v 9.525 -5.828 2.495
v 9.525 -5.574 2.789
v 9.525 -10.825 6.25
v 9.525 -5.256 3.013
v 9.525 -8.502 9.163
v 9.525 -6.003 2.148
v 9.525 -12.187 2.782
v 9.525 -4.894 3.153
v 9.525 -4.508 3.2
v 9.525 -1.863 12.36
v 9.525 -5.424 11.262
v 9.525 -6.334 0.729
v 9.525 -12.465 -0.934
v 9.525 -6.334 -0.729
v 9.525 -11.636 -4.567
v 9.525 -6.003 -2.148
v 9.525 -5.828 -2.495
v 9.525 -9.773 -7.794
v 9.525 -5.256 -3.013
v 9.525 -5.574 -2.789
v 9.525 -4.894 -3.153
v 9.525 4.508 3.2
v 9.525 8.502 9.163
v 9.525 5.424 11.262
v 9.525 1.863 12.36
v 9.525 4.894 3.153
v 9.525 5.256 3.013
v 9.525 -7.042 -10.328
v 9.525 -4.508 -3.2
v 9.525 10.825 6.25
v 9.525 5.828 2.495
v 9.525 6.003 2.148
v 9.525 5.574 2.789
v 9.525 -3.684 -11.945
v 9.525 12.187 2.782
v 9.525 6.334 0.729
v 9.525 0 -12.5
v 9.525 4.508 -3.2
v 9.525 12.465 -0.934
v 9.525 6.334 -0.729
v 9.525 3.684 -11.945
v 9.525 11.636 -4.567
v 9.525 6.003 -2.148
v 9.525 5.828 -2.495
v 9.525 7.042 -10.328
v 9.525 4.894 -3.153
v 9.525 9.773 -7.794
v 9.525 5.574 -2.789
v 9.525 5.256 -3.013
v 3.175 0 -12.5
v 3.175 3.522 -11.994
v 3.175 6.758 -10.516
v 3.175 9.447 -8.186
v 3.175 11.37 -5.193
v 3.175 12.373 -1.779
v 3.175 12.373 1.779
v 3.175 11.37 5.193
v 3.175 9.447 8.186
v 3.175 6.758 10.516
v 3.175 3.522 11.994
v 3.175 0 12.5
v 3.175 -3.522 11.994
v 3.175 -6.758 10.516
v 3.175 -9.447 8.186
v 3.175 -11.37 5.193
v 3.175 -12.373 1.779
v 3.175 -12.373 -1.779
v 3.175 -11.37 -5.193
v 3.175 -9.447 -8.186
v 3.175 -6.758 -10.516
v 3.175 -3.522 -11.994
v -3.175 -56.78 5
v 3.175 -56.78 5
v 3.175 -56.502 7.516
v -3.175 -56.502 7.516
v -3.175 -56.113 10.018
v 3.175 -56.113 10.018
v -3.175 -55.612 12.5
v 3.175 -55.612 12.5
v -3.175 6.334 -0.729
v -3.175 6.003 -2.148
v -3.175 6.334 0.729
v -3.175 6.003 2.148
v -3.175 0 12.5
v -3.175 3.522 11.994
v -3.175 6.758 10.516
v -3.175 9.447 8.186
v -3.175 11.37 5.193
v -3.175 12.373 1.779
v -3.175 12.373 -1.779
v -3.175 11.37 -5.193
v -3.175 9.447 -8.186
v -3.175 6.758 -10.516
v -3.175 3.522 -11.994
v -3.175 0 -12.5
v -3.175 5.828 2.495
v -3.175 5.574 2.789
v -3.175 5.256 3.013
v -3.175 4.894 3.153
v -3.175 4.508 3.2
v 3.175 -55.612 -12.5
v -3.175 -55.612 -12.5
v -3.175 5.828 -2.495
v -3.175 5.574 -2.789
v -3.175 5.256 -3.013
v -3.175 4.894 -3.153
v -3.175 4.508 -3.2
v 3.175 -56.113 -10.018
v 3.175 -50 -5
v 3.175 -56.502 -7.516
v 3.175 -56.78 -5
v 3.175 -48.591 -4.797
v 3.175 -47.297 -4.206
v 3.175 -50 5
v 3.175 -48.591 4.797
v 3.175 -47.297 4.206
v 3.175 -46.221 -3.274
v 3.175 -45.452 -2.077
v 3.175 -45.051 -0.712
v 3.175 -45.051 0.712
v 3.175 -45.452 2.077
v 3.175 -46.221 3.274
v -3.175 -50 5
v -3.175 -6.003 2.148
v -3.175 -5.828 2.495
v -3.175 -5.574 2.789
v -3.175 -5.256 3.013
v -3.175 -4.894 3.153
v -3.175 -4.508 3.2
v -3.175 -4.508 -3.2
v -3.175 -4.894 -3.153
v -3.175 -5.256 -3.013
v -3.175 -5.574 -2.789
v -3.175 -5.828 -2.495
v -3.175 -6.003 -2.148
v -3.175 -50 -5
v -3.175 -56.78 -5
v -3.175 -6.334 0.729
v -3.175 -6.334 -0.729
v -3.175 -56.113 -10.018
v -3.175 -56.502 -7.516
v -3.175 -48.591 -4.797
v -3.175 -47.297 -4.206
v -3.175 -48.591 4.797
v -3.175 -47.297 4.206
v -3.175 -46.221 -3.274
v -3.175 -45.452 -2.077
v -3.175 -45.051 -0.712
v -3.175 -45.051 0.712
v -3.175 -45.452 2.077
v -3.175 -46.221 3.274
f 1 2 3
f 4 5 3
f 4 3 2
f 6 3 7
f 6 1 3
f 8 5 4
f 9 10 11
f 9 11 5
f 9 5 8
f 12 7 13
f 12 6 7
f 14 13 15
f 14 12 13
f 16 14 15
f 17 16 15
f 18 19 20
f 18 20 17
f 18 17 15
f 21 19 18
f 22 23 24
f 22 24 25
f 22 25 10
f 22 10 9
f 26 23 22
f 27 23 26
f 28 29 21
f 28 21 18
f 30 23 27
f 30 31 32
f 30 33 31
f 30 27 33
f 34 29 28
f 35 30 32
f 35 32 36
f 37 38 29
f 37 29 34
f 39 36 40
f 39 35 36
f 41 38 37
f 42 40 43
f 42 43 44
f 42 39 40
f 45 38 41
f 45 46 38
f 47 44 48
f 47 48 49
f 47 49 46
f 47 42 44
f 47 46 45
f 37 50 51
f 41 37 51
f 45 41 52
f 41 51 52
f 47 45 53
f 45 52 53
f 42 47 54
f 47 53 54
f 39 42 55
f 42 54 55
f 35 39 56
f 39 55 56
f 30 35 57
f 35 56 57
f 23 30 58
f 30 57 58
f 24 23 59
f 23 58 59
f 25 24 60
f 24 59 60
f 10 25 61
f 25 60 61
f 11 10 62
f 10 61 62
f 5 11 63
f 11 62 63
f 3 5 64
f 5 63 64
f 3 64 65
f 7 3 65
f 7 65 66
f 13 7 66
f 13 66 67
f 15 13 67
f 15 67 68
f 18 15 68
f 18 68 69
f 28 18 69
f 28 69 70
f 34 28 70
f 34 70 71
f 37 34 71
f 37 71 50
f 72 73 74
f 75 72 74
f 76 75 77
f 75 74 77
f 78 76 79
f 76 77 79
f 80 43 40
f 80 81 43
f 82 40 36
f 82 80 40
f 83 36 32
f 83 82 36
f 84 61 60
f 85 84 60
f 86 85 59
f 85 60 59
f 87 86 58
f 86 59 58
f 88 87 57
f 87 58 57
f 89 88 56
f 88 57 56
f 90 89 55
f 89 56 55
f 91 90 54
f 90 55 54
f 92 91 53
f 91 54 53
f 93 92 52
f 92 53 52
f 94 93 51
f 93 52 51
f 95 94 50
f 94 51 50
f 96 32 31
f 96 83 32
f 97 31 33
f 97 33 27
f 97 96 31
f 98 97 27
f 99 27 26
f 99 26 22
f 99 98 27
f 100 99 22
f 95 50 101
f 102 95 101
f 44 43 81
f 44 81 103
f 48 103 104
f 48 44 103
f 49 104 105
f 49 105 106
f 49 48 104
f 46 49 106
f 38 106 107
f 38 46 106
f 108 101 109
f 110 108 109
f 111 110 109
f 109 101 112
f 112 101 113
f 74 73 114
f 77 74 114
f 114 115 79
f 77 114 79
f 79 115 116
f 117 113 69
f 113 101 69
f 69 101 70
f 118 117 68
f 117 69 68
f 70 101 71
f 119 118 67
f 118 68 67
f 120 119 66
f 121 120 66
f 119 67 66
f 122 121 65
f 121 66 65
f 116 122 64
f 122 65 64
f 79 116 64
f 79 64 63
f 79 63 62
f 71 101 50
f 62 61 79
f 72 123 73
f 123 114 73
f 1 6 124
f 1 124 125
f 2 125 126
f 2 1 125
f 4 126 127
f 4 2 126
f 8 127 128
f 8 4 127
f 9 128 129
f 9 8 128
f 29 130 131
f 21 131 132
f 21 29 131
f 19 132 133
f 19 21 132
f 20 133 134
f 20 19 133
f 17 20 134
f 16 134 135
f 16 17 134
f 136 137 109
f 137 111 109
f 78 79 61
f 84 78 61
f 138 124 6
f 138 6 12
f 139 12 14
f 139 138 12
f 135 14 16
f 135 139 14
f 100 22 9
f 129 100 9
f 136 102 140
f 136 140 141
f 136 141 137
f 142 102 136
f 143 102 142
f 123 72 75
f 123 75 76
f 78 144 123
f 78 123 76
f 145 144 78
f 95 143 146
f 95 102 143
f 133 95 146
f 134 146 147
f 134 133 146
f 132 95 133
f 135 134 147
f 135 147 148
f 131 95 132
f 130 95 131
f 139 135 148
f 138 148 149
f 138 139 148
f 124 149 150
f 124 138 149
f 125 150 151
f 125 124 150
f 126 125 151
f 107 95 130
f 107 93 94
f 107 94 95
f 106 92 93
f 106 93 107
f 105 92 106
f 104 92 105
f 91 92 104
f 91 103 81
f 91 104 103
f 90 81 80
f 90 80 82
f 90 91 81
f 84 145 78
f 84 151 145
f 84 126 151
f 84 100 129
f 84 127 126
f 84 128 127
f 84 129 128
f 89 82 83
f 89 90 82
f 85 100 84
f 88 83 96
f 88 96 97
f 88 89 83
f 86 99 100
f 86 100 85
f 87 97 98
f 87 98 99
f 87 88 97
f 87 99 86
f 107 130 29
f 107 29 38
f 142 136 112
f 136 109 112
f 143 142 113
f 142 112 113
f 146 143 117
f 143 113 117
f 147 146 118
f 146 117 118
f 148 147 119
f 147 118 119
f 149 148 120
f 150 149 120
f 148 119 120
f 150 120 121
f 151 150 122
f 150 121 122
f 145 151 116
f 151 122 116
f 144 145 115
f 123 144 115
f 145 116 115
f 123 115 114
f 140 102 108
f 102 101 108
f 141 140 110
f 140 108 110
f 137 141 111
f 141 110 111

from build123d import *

# Parameters (mm, degrees)
BOSS_EXTRUDE1_DEPTH = 3.175
SKETCH2_R           = 12.5
BOSS_EXTRUDE2_DEPTH = 6.35
FILLET1_R           = 1.5875


with BuildPart() as part:
    # Sketch1 → Boss-Extrude1 (new body, symmetric)
    with BuildSketch(Plane(origin=(0, 0, 0), x_dir=(0, 0, -1), z_dir=(1, 0, 0))):
        with BuildLine():
            Line((12.5, 0), (12.5, -55.612498595))
            ThreePointArc((12.5, -55.612498595), (8.769459923, -56.321368704), (5, -56.780278266))
            Line((5, -56.780278266), (5, -50))
            ThreePointArc((5, -50), (0, -45), (-5, -50))
            Line((-5, -50), (-5, -56.780278266))
            ThreePointArc((-5, -56.780278266), (-8.769459923, -56.321368704), (-12.5, -55.612498595))
            Line((-12.5, -55.612498595), (-12.5, 0))
            ThreePointArc((-12.5, 0), (0, 12.5), (12.5, 0))
        make_face()
        with BuildLine():
            Line((-3.2004, 5.51390651), (-3.2004, -5.51390651))
            ThreePointArc((-3.2004, -5.51390651), (0, -6.3754), (3.2004, -5.51390651))
            Line((3.2004, -5.51390651), (3.2004, 5.51390651))
            ThreePointArc((3.2004, 5.51390651), (0, 6.3754), (-3.2004, 5.51390651))
        make_face(mode=Mode.SUBTRACT)
    extrude(amount=BOSS_EXTRUDE1_DEPTH, both=True)

    # Sketch2 → Boss-Extrude2 (add)
    with BuildSketch(Plane(origin=(3.175, 0, 0), x_dir=(0, 0, -1), z_dir=(1, 0, 0))):
        Circle(SKETCH2_R)
        with BuildLine():
            Line((-3.2004, 5.51390651), (-3.2004, -5.51390651))
            ThreePointArc((-3.2004, -5.51390651), (0, -6.3754), (3.2004, -5.51390651))
            Line((3.2004, -5.51390651), (3.2004, 5.51390651))
            ThreePointArc((3.2004, 5.51390651), (0, 6.3754), (-3.2004, 5.51390651))
        make_face(mode=Mode.SUBTRACT)
    extrude(amount=BOSS_EXTRUDE2_DEPTH)

    # Fillet1
    fillet1_edges = [part.edges().sort_by_distance(p)[0] for p in [
        (0, 5.51390651, -3.2004),
        (0, 5.51390651, 3.2004),
        (0, -5.51390651, 3.2004),
        (0, -5.51390651, -3.2004),
    ]]
    fillet(fillet1_edges, radius=FILLET1_R)


solid = part.part
